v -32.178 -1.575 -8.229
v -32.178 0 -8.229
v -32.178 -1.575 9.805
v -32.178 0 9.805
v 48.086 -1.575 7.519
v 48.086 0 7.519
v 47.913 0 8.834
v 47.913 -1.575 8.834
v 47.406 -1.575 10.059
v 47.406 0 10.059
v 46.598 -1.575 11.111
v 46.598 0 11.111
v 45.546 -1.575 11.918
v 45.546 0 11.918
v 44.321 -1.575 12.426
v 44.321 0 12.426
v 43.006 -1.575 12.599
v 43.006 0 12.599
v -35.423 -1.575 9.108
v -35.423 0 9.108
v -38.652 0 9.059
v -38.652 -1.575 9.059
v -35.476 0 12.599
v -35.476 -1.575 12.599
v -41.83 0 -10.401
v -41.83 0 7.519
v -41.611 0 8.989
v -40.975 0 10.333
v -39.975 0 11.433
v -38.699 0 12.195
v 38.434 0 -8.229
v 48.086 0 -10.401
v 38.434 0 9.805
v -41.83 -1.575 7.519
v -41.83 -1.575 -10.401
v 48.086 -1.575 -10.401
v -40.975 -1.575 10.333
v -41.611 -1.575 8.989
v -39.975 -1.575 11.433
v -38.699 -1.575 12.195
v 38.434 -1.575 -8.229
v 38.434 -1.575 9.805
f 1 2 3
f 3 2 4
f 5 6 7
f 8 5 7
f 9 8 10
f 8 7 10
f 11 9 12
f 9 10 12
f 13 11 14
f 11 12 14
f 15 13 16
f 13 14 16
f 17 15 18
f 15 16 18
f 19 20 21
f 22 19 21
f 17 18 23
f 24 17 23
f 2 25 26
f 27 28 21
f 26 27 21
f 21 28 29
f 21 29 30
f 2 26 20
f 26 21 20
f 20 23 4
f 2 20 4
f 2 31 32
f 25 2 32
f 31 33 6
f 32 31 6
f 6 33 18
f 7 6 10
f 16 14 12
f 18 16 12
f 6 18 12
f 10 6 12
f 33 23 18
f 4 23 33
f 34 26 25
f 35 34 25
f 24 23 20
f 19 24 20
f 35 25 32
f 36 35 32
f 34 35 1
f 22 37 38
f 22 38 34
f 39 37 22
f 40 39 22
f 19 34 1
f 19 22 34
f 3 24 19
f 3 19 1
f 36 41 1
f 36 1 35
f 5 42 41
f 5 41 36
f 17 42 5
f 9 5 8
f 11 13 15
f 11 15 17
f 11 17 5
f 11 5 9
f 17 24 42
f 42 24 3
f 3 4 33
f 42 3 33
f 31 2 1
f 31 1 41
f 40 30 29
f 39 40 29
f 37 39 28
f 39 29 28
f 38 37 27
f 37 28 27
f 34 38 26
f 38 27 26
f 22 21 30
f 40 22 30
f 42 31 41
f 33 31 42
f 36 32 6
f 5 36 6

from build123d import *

# Parameters (mm, degrees)
F0_W     = 70.612
F0_H     = 18.034
F1_DEPTH = 1.5748


with BuildPart() as f1:
    # F0 (on Front) → F1 (new body)
    with BuildSketch(Plane.XZ):
        with BuildLine():
            Line((43.006146, 12.59901), (-35.475917, 12.59901))
            Line((-35.475917, 12.59901), (-35.423273, 9.108076))
            Line((-35.423273, 9.108076), (-38.651996, 9.059386))
            Line((-38.651996, 9.059386), (-38.69928, 12.194926))
            ThreePointArc((-38.69928, 12.194926), (-40.974954, 10.332579), (-41.829854, 7.51901))
            Line((-41.829854, 7.51901), (-41.829854, -10.40099))
            Line((-41.829854, -10.40099), (48.086146, -10.40099))
            Line((48.086146, -10.40099), (48.086146, 7.51901))
            ThreePointArc((48.086146, 7.51901), (46.598248, 11.111112), (43.006146, 12.59901))
        make_face()
        with Locations((3.128146, 0.78801)):
            Rectangle(F0_W, F0_H, mode=Mode.SUBTRACT)
    extrude(amount=F1_DEPTH)


solid = f1.part
